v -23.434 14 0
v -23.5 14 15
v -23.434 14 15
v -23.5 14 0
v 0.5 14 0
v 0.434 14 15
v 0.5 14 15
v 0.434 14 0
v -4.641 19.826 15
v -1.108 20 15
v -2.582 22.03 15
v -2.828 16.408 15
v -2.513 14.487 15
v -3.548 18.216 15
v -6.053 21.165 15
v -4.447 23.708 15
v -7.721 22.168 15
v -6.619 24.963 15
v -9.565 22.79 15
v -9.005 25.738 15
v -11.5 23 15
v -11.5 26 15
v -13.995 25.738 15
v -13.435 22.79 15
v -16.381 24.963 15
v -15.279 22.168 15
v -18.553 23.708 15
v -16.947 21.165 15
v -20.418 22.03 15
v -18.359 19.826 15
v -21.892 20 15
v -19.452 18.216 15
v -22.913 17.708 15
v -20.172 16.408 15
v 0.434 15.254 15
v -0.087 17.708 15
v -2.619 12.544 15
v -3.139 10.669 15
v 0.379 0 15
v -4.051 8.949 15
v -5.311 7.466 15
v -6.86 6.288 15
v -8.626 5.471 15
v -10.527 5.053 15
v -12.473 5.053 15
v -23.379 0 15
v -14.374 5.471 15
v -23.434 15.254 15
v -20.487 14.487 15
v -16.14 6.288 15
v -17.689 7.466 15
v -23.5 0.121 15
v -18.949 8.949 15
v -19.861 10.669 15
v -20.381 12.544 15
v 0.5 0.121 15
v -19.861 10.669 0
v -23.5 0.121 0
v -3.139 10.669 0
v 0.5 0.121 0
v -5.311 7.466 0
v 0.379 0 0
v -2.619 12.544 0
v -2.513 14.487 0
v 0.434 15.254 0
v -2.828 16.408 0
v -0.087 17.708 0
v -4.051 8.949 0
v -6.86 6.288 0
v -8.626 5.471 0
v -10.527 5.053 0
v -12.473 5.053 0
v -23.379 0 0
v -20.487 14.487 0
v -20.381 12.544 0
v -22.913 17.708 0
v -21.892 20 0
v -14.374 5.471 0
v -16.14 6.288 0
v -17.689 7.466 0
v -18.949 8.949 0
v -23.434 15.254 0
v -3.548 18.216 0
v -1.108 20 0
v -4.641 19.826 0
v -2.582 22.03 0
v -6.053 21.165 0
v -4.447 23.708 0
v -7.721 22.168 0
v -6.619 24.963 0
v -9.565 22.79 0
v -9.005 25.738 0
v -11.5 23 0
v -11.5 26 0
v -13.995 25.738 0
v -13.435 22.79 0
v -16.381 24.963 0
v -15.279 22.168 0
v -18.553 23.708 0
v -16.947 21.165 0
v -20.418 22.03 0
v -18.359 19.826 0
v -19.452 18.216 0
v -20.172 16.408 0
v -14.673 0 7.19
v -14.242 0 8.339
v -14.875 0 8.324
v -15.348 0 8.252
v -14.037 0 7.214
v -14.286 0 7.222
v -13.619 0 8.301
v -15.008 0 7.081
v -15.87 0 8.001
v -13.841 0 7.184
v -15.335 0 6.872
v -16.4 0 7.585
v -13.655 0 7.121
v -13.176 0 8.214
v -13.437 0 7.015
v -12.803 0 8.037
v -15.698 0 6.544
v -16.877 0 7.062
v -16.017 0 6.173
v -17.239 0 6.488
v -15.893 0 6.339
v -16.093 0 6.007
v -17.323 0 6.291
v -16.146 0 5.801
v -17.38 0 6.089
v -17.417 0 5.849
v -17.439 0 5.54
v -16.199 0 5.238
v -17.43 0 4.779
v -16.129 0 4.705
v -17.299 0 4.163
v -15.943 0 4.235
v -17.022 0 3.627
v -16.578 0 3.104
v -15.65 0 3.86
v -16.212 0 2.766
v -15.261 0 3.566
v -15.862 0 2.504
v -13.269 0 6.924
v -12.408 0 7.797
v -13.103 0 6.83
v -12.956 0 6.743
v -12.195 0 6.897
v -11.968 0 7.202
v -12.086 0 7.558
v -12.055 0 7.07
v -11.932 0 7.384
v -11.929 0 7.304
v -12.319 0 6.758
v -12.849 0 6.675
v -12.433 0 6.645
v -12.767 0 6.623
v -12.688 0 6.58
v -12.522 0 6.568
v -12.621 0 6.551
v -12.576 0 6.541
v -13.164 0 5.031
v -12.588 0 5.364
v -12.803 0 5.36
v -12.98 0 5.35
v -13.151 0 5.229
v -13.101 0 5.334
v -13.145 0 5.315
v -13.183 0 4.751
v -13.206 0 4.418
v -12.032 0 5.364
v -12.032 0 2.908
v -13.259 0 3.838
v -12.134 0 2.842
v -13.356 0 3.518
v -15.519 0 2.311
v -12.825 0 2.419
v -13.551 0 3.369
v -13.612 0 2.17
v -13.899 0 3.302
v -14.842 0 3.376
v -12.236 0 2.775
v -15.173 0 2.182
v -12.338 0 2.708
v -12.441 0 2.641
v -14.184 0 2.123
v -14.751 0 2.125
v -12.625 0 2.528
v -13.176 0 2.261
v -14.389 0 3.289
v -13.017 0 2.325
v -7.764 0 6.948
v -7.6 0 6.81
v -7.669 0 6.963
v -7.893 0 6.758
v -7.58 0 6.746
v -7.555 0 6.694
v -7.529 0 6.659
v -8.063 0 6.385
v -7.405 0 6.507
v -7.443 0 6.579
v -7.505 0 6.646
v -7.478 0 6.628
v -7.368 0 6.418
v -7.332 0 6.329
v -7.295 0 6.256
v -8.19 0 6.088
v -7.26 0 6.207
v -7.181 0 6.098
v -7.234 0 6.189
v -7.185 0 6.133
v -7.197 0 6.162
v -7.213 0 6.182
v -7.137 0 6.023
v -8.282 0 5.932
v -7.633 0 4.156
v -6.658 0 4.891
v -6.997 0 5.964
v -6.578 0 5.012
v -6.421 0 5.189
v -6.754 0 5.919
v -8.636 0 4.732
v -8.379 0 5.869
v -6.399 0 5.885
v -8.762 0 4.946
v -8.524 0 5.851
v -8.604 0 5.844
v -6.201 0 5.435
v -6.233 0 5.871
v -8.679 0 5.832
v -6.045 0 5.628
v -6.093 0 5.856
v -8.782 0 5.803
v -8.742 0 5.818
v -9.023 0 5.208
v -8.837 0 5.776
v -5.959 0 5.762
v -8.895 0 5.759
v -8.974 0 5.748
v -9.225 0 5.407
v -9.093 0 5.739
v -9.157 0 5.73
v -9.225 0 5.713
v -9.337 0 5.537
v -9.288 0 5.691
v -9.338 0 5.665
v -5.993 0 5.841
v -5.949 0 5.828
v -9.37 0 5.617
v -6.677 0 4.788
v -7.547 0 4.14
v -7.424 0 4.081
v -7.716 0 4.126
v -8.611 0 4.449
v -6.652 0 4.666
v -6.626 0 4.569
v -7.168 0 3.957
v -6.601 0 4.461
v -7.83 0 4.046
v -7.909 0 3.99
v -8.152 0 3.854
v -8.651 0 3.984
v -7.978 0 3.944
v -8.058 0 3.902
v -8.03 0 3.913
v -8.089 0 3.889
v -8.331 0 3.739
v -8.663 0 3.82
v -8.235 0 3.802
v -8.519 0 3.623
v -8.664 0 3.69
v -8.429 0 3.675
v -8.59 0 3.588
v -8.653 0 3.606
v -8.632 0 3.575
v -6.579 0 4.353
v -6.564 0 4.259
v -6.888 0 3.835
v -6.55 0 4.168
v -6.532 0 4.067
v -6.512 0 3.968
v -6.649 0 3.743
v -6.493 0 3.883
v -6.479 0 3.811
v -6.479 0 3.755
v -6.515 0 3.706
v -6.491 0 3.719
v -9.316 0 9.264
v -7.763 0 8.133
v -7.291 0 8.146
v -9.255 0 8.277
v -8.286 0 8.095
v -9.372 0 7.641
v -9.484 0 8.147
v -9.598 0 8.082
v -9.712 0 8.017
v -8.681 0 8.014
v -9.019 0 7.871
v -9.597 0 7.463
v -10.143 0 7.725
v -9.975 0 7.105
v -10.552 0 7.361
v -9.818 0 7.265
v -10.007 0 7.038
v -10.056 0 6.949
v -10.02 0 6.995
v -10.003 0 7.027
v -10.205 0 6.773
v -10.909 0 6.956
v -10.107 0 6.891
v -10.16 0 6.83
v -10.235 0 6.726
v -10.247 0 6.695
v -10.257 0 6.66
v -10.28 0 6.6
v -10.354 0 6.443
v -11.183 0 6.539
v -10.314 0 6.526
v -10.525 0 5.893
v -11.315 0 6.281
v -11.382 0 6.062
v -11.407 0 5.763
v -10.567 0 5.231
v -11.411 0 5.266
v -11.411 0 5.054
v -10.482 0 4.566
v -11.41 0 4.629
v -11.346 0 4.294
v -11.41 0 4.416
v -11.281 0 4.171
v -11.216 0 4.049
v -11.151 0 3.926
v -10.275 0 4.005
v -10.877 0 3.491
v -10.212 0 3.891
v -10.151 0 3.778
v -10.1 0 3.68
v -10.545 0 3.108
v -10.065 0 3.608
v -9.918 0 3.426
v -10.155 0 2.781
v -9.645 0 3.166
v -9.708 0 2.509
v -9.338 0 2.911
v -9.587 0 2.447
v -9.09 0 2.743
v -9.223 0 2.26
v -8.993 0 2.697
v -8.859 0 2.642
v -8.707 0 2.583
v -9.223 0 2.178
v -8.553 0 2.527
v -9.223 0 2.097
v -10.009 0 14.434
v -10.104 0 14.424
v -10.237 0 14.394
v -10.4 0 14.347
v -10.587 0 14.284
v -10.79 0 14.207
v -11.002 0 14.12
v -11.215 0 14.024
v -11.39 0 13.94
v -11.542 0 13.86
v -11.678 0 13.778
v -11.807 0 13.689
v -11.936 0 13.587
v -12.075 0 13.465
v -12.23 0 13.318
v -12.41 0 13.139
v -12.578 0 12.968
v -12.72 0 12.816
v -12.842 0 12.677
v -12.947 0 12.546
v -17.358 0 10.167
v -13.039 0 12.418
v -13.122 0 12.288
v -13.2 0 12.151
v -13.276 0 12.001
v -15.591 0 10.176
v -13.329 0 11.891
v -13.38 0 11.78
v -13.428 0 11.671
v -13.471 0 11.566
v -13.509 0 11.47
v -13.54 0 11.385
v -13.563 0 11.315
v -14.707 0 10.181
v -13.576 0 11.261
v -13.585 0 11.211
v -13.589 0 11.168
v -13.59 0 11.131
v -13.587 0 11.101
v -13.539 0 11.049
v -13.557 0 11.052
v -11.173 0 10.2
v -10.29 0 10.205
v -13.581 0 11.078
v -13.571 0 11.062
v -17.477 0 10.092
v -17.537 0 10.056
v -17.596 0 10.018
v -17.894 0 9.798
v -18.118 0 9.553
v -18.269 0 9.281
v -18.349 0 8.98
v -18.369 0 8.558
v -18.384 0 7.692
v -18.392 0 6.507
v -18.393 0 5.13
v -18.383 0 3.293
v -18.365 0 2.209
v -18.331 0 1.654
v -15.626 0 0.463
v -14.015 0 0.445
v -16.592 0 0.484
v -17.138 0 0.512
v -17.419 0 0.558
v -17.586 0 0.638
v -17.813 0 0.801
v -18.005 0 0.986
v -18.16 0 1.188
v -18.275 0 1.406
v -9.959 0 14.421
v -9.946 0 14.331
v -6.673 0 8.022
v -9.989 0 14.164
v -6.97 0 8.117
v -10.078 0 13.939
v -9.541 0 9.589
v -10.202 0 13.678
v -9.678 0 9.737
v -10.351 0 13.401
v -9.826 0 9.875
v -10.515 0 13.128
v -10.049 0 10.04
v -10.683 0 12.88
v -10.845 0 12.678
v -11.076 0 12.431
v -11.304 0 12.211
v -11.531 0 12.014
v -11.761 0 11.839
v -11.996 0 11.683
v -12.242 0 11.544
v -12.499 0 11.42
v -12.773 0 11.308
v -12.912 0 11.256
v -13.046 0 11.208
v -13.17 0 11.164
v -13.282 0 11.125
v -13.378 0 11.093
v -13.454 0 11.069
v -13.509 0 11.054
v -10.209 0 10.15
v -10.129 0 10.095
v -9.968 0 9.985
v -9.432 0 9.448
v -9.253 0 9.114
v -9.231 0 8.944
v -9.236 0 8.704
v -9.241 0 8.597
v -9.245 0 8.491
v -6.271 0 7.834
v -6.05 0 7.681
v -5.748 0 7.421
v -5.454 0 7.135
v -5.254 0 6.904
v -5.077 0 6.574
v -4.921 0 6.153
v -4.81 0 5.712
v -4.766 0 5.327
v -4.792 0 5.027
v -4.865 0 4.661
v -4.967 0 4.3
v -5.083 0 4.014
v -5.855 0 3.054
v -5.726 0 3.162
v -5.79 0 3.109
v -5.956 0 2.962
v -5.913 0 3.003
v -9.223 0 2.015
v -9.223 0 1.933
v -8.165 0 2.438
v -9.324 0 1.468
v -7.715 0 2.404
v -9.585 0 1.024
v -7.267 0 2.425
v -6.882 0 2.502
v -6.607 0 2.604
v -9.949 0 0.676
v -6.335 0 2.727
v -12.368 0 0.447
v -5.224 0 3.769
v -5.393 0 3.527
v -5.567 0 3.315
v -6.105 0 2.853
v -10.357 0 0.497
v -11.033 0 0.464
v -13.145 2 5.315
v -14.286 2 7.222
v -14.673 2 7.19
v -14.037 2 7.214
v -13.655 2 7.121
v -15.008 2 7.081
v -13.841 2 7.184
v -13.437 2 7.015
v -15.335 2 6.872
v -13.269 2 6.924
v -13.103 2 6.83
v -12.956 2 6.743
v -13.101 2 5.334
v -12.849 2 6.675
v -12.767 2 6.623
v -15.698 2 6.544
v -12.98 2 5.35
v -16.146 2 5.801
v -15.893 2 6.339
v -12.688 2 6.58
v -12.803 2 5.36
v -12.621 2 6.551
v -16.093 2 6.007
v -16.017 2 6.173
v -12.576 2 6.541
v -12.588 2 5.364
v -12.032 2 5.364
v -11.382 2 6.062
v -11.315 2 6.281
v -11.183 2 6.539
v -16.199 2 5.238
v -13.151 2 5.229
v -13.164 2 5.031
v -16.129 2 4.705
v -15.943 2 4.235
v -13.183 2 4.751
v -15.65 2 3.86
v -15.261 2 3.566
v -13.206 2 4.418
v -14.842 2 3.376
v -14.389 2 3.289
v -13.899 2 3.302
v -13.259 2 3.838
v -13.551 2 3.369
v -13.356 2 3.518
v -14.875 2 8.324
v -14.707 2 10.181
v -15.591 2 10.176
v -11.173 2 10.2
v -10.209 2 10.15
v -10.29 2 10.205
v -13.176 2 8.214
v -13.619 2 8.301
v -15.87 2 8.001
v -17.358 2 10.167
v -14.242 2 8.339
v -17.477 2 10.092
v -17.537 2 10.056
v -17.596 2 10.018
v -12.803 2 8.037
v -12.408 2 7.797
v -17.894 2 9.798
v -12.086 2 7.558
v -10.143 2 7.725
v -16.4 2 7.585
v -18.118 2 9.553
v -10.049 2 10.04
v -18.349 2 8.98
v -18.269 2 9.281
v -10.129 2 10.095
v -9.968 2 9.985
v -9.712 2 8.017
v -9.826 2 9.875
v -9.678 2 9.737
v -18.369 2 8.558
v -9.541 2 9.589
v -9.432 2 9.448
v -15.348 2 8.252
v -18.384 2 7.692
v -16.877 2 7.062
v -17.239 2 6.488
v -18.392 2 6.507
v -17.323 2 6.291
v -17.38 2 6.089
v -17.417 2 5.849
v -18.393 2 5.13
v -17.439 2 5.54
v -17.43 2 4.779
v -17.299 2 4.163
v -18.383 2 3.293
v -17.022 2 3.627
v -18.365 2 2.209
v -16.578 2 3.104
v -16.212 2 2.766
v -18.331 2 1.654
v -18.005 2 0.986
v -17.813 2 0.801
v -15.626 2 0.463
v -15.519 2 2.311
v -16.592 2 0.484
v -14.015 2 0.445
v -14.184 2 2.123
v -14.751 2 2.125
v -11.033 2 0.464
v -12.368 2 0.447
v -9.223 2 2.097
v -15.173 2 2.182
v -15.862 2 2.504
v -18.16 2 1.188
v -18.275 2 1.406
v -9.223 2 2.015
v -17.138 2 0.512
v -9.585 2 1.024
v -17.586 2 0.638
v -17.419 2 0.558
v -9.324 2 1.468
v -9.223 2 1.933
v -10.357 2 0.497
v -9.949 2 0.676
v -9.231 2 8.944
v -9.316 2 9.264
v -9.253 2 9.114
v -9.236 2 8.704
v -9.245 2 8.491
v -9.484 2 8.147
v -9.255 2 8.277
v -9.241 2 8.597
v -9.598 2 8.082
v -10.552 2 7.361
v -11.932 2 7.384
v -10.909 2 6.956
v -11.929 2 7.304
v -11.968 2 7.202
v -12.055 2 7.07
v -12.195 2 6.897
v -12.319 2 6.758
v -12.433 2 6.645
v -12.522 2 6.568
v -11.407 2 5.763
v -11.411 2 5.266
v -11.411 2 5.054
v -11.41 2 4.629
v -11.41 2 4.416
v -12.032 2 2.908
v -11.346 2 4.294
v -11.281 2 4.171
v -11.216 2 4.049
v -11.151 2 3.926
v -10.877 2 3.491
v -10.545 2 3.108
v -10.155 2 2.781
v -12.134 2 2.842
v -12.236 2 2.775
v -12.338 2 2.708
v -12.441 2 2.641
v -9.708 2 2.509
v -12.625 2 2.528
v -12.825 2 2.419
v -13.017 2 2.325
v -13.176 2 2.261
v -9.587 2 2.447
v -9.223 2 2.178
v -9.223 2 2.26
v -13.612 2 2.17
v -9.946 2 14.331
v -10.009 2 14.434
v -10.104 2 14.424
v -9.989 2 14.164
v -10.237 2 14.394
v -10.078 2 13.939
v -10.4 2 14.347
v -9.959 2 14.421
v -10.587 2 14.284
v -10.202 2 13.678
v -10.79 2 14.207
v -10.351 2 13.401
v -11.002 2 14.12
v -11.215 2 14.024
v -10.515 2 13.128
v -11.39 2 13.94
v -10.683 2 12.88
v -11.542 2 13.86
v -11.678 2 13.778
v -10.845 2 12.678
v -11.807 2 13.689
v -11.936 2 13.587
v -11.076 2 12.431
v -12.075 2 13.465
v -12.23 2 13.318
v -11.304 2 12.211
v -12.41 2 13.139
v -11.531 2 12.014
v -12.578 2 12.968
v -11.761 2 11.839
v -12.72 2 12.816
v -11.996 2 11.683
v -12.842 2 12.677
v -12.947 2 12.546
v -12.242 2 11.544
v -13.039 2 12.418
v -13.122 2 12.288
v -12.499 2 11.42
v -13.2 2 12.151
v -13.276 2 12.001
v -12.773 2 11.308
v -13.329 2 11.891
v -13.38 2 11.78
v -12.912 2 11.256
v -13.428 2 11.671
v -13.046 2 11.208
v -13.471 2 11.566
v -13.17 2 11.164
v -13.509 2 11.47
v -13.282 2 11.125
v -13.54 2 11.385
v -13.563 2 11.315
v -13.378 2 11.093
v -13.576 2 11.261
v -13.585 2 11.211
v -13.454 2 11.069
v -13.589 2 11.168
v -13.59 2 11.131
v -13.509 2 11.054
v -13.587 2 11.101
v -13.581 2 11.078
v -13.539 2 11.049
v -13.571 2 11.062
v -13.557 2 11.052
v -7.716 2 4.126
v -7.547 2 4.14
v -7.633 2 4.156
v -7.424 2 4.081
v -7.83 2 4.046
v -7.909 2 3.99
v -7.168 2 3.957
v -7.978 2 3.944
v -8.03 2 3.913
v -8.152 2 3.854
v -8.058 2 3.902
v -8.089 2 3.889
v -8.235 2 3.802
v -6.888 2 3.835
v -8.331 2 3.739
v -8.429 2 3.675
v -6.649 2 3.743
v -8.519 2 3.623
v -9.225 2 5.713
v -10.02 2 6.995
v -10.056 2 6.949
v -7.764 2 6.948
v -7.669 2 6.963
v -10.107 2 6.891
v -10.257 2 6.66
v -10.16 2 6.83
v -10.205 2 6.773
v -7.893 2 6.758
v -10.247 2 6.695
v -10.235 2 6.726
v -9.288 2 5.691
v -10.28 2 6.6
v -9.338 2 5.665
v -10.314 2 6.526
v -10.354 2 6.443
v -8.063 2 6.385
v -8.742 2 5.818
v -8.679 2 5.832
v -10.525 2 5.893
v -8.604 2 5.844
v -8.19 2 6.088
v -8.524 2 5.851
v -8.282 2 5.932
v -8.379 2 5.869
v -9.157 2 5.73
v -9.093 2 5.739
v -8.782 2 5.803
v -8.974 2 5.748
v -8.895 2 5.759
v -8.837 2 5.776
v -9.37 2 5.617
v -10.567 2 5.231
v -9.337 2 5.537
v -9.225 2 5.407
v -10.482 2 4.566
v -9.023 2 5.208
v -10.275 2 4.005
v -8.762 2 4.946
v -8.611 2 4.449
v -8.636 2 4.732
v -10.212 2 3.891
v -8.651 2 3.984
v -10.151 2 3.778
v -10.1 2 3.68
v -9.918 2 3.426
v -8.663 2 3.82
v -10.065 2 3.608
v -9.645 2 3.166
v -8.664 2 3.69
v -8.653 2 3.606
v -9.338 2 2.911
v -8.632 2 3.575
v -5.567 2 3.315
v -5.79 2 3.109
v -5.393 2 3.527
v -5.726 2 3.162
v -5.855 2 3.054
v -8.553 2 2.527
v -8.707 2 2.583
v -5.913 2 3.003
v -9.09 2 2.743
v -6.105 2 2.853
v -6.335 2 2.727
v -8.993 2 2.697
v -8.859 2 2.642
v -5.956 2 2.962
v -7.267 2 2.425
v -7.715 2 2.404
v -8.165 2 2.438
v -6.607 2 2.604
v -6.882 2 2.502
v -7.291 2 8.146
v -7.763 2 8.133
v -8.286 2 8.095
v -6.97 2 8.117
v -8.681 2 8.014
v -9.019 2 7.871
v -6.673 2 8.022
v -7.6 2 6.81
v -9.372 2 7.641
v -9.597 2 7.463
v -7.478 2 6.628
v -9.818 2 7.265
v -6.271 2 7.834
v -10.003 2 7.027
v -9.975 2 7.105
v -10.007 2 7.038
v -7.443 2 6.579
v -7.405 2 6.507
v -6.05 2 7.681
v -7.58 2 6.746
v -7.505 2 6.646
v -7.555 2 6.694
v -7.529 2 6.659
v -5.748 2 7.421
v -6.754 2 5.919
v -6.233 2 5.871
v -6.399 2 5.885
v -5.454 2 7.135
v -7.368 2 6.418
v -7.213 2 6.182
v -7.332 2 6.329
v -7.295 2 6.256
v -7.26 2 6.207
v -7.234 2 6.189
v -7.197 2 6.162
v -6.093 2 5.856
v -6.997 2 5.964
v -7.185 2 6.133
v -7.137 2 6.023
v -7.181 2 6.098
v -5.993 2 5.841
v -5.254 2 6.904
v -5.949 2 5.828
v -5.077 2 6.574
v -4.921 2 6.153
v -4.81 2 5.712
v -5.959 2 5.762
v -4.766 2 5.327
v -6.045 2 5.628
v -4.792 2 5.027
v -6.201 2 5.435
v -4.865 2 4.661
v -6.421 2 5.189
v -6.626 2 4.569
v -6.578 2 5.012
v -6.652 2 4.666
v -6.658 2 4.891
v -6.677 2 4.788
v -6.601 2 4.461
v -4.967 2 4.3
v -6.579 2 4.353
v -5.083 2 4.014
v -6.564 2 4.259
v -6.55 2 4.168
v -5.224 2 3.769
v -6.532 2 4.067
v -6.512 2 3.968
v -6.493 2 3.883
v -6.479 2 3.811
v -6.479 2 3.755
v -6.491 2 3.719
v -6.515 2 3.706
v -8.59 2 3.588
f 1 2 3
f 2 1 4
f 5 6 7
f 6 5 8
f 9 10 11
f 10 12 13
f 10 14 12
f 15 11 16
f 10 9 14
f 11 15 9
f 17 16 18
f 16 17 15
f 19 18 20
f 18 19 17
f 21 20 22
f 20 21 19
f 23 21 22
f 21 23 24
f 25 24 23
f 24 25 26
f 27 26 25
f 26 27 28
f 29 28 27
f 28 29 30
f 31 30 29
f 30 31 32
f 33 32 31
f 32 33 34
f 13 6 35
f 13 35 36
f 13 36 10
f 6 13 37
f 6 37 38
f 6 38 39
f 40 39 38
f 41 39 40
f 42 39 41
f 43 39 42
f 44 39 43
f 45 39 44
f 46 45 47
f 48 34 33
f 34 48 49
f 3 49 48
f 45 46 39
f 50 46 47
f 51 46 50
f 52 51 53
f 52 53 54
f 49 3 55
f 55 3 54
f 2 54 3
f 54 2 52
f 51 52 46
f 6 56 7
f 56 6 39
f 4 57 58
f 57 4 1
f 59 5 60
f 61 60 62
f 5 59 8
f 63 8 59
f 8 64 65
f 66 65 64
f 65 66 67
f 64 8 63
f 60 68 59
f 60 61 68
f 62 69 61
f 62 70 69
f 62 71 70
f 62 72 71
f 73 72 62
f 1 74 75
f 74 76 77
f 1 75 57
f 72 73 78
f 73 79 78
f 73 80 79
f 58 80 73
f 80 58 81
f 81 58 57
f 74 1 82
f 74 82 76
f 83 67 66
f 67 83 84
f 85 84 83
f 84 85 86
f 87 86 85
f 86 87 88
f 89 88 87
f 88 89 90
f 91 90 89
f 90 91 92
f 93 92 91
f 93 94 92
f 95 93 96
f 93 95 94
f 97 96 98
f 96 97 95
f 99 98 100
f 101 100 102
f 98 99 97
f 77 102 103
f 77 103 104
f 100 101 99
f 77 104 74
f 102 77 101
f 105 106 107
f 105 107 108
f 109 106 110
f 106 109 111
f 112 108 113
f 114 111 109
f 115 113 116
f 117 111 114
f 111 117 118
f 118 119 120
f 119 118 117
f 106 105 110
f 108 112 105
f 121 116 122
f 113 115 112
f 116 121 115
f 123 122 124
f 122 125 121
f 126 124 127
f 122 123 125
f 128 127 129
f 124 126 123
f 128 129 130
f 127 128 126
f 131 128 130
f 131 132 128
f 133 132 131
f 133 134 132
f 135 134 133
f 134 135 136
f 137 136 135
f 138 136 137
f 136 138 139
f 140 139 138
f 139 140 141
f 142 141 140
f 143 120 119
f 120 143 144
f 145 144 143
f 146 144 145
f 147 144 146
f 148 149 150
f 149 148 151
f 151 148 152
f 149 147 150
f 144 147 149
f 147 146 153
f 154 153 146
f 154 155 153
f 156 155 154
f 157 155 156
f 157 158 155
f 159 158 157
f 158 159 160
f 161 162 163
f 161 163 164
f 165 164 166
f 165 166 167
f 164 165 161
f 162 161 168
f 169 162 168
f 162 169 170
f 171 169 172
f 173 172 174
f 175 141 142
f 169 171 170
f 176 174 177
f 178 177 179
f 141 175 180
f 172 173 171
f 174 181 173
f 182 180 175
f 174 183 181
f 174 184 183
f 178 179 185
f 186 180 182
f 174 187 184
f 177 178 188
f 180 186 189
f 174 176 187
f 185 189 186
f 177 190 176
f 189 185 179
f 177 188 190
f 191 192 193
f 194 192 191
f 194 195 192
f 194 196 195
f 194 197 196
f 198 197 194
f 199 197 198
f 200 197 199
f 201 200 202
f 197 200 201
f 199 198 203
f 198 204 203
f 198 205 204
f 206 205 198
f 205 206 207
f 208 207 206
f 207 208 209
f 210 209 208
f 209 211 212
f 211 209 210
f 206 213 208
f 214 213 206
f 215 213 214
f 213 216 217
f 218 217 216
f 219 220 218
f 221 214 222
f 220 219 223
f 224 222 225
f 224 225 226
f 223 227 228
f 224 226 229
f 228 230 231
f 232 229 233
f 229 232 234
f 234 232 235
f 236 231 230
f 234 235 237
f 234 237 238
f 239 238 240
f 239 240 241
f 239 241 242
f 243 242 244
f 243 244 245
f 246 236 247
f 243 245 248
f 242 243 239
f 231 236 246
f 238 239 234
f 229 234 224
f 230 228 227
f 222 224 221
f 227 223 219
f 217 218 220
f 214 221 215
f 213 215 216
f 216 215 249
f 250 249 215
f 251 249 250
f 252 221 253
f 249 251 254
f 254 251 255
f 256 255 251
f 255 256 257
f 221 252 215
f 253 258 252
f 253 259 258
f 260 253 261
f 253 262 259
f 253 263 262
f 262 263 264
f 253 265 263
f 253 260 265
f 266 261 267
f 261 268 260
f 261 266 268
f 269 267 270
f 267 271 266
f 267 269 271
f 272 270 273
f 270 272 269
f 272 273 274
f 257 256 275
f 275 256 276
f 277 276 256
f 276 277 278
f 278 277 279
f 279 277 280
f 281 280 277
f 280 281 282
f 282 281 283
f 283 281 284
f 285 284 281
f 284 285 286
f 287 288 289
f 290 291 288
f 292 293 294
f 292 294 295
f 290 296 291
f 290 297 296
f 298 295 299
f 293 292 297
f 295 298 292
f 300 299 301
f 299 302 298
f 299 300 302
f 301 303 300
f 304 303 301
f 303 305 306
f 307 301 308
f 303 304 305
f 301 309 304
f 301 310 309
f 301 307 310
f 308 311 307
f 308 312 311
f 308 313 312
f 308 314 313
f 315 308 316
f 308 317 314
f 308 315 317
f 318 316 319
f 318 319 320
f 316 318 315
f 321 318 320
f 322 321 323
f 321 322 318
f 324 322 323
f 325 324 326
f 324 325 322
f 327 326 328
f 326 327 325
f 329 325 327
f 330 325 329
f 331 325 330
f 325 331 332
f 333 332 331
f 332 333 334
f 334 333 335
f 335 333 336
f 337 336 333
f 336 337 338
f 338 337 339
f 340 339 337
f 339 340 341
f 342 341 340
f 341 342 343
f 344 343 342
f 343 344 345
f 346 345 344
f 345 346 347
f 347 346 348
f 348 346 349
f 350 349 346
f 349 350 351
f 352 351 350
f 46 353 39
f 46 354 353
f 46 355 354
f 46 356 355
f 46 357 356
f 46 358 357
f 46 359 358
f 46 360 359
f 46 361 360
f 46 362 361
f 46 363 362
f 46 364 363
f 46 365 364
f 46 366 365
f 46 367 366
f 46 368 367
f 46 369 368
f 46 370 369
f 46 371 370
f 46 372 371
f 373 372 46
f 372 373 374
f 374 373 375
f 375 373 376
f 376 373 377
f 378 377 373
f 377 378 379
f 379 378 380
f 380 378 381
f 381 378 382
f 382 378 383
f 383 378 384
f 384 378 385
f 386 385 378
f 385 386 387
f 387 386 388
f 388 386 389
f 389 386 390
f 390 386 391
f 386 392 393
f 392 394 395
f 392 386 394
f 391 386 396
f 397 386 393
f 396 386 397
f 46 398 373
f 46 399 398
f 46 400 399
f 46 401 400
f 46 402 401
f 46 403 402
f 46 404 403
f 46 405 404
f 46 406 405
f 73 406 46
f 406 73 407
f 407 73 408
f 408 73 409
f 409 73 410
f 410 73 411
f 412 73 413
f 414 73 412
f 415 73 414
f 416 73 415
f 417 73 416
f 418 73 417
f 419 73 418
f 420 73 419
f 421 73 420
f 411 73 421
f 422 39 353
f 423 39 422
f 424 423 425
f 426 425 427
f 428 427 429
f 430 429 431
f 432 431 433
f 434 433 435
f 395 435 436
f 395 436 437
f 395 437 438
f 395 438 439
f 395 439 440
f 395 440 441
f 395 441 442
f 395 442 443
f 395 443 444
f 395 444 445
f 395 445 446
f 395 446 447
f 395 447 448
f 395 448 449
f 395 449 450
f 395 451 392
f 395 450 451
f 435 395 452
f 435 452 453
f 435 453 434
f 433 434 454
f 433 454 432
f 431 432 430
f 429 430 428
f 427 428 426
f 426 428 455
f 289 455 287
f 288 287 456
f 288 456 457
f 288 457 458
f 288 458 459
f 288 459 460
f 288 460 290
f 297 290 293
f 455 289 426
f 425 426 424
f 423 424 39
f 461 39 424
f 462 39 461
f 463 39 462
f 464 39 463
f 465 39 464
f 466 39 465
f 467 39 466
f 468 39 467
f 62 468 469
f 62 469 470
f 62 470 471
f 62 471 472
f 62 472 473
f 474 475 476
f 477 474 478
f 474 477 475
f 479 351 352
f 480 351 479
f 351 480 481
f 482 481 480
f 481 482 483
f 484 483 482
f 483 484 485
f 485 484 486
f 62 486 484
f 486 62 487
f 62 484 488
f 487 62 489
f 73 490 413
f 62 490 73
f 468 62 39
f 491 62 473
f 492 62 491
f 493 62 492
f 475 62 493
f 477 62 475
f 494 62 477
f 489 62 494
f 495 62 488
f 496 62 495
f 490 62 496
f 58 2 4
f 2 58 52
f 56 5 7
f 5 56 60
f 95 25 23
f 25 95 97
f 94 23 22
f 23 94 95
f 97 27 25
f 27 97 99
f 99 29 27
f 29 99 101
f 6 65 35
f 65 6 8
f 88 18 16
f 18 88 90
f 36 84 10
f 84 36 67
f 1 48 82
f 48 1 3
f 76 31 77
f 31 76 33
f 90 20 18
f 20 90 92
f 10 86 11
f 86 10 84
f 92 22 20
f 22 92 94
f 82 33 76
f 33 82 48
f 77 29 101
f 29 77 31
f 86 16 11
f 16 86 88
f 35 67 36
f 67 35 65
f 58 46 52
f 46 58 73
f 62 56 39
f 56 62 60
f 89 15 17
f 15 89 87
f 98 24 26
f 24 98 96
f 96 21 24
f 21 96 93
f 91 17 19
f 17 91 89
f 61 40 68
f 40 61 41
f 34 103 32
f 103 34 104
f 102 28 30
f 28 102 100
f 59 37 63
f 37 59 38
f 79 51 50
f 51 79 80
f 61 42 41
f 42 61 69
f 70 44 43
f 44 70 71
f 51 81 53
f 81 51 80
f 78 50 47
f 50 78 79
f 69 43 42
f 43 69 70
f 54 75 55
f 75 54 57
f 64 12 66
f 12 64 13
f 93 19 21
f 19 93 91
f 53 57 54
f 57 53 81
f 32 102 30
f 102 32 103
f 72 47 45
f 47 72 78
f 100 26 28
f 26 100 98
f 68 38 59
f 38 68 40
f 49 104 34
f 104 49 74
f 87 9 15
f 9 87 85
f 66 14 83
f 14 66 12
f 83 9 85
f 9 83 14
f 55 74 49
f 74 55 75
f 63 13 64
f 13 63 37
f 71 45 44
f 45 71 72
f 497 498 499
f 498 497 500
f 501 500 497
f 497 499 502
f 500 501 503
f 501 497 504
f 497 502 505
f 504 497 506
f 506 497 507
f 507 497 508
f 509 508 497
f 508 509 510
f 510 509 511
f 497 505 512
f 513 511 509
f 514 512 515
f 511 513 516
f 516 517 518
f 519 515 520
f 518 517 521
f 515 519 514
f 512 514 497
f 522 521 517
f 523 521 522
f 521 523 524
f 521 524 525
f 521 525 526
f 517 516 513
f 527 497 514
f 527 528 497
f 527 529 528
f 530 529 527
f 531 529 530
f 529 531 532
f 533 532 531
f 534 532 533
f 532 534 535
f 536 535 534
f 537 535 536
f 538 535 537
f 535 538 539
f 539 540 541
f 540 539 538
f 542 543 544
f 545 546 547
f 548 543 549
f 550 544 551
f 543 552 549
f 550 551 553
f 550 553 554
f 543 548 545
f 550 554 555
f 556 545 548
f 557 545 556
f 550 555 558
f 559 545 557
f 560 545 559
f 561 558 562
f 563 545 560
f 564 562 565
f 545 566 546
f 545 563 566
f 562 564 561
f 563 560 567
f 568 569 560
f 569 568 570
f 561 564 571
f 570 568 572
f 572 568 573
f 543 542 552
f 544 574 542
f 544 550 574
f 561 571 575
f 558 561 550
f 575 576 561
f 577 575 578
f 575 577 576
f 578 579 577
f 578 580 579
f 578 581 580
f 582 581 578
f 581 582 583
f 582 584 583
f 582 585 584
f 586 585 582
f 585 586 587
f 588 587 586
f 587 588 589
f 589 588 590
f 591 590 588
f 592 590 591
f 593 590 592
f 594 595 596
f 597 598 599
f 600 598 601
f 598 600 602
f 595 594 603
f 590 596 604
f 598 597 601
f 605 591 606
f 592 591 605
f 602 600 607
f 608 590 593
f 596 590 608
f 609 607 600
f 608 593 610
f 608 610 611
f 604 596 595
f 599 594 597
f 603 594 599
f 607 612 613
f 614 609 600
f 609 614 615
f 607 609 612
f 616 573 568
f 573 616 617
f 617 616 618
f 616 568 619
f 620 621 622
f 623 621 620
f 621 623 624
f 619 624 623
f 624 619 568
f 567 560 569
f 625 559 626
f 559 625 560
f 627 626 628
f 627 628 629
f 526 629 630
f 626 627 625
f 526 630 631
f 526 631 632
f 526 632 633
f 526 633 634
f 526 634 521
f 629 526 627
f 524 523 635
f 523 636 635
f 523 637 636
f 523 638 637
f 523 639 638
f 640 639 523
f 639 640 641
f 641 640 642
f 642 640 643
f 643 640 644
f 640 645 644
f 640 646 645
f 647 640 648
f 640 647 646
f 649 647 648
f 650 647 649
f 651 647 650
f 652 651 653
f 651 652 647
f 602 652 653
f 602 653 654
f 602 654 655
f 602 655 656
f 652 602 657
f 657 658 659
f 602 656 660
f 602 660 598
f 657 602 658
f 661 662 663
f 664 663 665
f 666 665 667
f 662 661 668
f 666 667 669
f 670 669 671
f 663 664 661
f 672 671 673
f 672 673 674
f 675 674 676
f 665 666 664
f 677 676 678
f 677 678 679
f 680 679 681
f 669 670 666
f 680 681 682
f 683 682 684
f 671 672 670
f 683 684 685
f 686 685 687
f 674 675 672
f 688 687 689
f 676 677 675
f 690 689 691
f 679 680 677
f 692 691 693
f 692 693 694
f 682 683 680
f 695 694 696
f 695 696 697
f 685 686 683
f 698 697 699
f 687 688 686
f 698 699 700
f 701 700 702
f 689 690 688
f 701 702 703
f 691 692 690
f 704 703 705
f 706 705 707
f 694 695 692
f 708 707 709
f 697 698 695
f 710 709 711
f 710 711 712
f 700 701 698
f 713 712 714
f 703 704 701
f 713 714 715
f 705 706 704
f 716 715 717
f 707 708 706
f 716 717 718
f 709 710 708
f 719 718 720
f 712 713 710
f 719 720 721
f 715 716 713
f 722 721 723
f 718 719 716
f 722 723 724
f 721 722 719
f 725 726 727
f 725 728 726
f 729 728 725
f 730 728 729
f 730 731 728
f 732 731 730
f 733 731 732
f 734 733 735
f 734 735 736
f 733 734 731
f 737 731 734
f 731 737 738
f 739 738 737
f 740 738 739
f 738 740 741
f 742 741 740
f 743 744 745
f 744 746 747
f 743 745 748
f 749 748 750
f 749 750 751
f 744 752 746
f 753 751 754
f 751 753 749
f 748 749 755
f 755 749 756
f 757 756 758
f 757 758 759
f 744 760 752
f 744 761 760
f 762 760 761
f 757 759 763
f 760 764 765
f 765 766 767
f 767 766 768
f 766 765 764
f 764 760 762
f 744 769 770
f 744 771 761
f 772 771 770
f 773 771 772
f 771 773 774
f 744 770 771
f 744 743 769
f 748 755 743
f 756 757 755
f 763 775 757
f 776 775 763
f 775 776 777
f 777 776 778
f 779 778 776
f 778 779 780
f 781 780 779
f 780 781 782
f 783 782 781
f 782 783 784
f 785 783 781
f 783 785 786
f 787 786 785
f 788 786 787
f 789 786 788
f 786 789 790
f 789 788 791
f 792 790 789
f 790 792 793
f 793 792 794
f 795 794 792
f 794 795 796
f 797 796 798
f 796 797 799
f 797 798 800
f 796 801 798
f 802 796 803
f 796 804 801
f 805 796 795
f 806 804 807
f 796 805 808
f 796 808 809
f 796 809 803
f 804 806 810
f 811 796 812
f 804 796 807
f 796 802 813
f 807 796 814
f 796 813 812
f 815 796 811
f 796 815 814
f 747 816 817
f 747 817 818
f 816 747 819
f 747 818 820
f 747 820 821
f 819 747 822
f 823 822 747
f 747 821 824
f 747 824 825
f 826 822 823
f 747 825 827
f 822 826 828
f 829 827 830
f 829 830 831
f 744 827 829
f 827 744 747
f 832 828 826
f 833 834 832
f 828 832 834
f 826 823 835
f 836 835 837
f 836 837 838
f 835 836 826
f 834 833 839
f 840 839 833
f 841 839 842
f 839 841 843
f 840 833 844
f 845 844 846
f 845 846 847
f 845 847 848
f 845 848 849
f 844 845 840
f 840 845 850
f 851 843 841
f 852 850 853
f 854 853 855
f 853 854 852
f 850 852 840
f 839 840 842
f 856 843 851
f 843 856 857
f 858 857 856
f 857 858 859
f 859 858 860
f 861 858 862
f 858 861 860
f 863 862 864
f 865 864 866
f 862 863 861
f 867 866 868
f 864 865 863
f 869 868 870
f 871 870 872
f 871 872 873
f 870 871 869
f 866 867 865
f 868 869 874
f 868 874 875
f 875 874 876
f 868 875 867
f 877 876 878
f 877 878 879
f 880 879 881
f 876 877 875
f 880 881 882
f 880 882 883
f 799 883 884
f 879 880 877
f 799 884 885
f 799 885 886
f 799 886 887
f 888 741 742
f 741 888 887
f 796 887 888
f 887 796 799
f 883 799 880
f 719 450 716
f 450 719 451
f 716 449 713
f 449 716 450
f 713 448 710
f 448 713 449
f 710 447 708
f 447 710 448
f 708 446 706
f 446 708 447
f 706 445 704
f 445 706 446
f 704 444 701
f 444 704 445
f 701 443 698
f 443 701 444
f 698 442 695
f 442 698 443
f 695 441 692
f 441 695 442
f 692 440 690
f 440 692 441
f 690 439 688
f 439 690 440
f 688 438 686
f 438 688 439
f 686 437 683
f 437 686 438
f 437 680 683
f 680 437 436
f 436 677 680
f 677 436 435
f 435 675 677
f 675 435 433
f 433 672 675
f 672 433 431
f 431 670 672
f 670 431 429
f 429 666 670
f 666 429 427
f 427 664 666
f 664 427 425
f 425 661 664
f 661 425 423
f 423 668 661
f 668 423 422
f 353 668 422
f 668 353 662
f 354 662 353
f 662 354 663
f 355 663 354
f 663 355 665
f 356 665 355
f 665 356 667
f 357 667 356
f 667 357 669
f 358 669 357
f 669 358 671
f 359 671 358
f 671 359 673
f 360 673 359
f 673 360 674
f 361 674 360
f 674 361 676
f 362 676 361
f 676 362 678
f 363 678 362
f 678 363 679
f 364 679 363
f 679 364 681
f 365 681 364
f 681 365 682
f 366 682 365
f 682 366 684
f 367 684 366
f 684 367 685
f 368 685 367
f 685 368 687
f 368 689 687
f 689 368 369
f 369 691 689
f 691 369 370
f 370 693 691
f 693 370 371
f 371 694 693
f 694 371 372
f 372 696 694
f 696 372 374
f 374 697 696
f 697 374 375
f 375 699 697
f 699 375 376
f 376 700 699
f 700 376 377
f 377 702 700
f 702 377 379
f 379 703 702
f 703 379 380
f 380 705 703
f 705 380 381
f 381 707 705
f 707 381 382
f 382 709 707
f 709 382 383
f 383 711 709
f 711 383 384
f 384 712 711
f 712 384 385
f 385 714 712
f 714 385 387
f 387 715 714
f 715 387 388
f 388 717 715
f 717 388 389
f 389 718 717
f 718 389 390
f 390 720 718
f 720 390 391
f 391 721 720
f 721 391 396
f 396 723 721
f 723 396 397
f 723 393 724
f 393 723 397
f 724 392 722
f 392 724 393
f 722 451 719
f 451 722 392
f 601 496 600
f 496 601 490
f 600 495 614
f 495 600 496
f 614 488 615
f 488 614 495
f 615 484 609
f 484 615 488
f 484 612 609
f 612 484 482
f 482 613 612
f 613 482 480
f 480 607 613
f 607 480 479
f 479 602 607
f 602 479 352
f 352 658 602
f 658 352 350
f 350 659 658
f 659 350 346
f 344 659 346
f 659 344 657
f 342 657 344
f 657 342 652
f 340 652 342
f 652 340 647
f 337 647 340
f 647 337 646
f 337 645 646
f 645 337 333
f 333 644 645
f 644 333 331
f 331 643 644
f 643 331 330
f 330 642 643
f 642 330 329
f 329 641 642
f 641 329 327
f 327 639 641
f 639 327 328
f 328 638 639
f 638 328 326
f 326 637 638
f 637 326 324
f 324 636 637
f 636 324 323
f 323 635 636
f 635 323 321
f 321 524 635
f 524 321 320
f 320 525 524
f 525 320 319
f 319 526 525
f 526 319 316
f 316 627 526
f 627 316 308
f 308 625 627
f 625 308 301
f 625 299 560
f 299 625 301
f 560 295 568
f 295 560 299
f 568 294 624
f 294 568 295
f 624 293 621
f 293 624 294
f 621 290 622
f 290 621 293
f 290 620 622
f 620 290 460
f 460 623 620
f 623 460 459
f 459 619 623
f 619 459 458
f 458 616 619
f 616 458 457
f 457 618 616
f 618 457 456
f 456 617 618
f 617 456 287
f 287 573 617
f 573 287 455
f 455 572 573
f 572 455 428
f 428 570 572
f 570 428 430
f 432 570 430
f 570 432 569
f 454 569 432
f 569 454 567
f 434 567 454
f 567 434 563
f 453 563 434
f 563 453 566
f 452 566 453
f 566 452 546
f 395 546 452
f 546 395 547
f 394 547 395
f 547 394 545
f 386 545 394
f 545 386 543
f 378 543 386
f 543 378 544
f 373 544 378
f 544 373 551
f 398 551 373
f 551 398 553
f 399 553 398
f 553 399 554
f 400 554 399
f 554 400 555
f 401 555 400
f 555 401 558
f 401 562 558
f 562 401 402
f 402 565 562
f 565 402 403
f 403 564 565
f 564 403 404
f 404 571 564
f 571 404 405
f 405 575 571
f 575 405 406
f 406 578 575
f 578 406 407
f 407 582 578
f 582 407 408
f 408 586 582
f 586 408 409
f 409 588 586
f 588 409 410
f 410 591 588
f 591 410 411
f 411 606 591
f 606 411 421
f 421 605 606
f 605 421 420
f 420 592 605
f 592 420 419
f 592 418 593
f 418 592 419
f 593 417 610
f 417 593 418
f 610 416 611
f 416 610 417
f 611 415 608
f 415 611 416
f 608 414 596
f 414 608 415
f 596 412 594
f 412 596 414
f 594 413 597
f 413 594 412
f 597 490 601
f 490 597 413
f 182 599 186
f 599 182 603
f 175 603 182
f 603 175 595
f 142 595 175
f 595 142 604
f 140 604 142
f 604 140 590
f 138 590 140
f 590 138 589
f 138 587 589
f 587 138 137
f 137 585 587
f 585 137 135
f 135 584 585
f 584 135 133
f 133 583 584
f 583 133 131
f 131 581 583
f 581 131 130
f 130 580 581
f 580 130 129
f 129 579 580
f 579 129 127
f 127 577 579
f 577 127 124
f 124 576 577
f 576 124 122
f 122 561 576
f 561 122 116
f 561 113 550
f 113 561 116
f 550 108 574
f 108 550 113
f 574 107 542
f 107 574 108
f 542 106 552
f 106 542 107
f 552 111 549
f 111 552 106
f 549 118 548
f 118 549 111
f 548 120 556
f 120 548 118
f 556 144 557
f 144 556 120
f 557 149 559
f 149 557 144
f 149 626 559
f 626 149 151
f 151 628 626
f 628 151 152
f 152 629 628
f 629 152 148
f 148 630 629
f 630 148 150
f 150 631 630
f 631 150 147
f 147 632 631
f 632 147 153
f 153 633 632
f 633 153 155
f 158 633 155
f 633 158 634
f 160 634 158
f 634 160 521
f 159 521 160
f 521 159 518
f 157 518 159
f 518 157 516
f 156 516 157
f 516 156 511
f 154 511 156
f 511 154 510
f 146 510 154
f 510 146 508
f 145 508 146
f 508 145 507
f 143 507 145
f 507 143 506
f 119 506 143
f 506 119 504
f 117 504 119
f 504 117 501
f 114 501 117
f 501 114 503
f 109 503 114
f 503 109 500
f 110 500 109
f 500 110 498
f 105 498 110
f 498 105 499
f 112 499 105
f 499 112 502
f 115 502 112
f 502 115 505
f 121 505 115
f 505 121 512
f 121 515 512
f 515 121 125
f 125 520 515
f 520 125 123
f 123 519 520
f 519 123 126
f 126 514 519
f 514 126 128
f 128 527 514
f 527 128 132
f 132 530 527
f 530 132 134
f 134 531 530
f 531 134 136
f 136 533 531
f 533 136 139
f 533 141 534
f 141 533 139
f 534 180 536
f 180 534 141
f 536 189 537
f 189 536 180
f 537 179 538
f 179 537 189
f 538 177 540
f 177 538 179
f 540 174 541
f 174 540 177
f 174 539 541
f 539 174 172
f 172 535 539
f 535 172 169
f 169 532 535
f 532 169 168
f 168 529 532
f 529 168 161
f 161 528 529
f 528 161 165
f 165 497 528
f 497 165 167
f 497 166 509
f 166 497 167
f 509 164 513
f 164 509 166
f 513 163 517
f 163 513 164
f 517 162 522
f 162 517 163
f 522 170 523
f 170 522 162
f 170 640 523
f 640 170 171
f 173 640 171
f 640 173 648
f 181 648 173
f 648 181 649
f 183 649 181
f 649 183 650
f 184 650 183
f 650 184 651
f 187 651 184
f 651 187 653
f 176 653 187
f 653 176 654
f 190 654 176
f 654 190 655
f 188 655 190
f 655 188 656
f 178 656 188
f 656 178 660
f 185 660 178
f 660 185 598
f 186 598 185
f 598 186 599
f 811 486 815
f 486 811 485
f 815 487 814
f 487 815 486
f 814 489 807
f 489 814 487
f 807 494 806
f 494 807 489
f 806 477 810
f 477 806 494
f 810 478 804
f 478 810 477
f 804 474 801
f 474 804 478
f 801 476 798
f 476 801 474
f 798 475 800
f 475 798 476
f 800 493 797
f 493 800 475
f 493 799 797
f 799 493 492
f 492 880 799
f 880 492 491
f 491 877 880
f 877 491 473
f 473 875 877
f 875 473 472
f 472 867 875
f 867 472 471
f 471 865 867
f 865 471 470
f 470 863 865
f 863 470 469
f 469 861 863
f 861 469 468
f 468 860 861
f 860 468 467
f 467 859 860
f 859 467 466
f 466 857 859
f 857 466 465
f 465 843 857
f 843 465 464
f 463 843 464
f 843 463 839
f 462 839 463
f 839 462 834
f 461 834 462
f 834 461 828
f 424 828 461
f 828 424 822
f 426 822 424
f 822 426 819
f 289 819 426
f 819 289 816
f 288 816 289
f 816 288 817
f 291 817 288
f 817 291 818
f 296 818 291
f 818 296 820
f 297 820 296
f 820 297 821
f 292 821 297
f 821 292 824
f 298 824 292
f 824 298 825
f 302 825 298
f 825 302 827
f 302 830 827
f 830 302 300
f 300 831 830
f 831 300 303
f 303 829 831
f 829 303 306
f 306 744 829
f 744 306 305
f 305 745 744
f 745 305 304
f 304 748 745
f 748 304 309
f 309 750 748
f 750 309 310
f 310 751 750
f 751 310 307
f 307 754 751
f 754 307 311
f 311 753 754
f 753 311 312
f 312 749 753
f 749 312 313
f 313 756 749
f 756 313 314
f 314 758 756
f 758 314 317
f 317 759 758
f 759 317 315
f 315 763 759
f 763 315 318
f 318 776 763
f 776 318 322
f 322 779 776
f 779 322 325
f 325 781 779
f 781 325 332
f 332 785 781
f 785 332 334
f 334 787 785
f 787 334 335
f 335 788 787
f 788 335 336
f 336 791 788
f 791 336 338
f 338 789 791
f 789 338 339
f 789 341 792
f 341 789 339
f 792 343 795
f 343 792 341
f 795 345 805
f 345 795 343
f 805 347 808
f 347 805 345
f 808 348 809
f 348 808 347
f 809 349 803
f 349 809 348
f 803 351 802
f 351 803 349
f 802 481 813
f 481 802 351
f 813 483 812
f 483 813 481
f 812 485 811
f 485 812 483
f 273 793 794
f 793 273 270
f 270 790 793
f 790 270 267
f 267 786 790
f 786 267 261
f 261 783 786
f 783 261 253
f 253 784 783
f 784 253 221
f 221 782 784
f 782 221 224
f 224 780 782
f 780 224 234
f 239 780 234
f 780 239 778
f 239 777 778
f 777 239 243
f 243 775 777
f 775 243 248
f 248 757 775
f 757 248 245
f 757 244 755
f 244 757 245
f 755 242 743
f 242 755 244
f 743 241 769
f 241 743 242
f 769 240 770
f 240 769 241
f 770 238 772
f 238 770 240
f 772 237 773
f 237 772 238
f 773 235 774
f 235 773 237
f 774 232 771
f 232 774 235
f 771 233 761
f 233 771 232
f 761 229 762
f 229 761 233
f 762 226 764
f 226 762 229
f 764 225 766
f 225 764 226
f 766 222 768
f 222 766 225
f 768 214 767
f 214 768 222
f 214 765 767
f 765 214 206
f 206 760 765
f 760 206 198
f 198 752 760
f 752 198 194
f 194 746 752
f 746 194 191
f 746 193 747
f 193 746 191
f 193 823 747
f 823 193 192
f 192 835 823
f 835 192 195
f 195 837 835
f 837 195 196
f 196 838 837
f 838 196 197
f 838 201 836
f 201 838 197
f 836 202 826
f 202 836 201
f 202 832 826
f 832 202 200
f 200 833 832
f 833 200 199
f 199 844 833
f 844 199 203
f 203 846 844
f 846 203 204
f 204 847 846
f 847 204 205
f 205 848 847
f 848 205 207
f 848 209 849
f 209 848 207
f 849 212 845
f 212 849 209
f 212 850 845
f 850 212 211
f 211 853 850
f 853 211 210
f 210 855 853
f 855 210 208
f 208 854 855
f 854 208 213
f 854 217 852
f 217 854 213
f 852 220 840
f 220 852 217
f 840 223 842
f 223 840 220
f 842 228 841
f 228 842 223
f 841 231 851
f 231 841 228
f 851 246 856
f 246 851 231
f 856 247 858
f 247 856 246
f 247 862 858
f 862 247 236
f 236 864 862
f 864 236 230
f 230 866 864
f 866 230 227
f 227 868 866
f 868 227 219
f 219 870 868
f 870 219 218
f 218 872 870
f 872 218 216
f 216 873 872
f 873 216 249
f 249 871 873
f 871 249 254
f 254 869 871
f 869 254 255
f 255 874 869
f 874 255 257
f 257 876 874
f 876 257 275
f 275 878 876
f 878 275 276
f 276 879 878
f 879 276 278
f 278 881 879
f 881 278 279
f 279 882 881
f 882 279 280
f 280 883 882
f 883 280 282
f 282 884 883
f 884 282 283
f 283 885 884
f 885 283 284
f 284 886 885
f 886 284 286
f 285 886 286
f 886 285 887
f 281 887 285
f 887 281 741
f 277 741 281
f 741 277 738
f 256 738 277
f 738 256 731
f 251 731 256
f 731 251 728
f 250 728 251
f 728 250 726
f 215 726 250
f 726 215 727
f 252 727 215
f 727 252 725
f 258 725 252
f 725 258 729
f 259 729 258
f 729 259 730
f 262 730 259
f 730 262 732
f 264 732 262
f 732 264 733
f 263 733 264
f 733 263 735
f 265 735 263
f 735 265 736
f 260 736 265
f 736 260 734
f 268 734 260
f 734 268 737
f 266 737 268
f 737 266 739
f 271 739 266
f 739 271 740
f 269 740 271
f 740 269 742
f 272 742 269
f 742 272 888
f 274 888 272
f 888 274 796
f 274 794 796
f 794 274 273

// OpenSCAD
// Sized RepRap Power Ring
// By fillibar
// Description:
//   This ring is based on the parametric power ring. Rather than use specific values that
//   some may not know I used the "standard" ring sizes for most of the world. Enter the region
//   then the other parameters. The SizedPowerRing module will just call the normal PowerRing
//   module with the correct inner size.
//
// Based on:
//  Parametric RepRap Power Ring by Daniel Harmsworth (http://www.thingiverse.com/thing:3917)
//  RepRap Power Ring by Zack Hoeken (http://www.thingiverse.com/thing:48)
//  Ring sizes per Wikipedia (http://en.wikipedia.org/wiki/Ring_size)
//
// Licensed under the Creative Commons - GNU GPL, http://creativecommons.org/licenses/GPL/2.0/
//
// Parameters are as follows:
// 1) Sets ring sizing region. Values are:
//   0 for United States and Canada
//   1 for UK, Ireland, Australia & New Zealand (Please note: "" is needed around non-numerical values)
//   2 for India, China & Japan
//   3 for Switzerland
// 2) Sets internal ring size based on ring sizes for the region set in parameter 1.
// 3) Sets thickness of the ring (lengthways along the finger).
// 4) Sets depth of the RepRap logo embossed on the ring.
// 5) Sets whether the front edges are beveled or not.


PowerRing( 18, 15, 2, true );
 //Gumcam(15,3);
//TearDrop(15,3);


module PowerRing ( diameter, thick, depth, bevel )
{
  rotate( a = [ 0, 0, 90 ] )
  {
    difference()
    {
      union ()
      {
        translate ( v = [0,-0.5,0] )
        cube( [ ( diameter / 2 ) + 5, diameter + 6, thick], center = false );
        translate( v = [ ( diameter / 2 ) + 5, ( diameter / 2 ) + 2.5, ] )
        cylinder( h = thick, r = ( diameter / 2 ) + 3 );
      }
     translate( v = [(diameter / 2) + 5,(diameter / 2) + 2.5,-1 ] )
     cylinder(h=thick+2,r=diameter / 2);
    
	translate( v = [2,(diameter / 2) + 6,thick / 2-2.2] )
    rotate ( a = [90,0,180])  
	//TearDrop(thick / 3,depth + 1);
    Gumcam(thick / 3,depth + 1); 
	if (bevel)
      {
        /*translate ( v = [0,(diameter / 2)+2.5,0] )
        rotate ( a = [0,45,0])
        cube([3,diameter + 20,3],center = true);
        translate ( v = [0,(diameter / 2)+2.5,thick] )
        rotate ( a = [0,45,0])
        cube([3,diameter + 20,3],center = true);*/
        translate ( v = [0,diameter+7.5,(thick / 2)] )
        rotate ( a = [0,0,45]) 
        cube([3,3,thick + 10],center = true);
        translate ( v = [0,-2.5,(thick / 2)] )
        rotate ( a = [0,0,45])
        cube([3,3,thick + 10],center = true);
      }
    }
  }
}

module TearDrop(radius,depth)
{
  teardiff = (	sqrt(	( (radius * 2) * (radius * 2) ) * 2 ) - (radius * 2) ) / 2;
  translate(v = [depth/2,0,-teardiff / 2])
  rotate(a = [0,-90,0])
  union()
  {
    cylinder(h=depth,r=radius, center = true);
    intersection()
    {
      rotate(a = [0,0,45])
      cube([2*radius,2*radius,depth], center = true);
      translate([1.65*radius, 0, 0])
      cube([2*radius,2*radius,depth], center = true);
    }
  }
}

module Gumcam(radius,depth)
{
	scale([1,radius/28,radius/28])
	rotate(a = [0,90,0])
	linear_extrude(height = depth)
	import("GUMCAMv3.dxf");
}
